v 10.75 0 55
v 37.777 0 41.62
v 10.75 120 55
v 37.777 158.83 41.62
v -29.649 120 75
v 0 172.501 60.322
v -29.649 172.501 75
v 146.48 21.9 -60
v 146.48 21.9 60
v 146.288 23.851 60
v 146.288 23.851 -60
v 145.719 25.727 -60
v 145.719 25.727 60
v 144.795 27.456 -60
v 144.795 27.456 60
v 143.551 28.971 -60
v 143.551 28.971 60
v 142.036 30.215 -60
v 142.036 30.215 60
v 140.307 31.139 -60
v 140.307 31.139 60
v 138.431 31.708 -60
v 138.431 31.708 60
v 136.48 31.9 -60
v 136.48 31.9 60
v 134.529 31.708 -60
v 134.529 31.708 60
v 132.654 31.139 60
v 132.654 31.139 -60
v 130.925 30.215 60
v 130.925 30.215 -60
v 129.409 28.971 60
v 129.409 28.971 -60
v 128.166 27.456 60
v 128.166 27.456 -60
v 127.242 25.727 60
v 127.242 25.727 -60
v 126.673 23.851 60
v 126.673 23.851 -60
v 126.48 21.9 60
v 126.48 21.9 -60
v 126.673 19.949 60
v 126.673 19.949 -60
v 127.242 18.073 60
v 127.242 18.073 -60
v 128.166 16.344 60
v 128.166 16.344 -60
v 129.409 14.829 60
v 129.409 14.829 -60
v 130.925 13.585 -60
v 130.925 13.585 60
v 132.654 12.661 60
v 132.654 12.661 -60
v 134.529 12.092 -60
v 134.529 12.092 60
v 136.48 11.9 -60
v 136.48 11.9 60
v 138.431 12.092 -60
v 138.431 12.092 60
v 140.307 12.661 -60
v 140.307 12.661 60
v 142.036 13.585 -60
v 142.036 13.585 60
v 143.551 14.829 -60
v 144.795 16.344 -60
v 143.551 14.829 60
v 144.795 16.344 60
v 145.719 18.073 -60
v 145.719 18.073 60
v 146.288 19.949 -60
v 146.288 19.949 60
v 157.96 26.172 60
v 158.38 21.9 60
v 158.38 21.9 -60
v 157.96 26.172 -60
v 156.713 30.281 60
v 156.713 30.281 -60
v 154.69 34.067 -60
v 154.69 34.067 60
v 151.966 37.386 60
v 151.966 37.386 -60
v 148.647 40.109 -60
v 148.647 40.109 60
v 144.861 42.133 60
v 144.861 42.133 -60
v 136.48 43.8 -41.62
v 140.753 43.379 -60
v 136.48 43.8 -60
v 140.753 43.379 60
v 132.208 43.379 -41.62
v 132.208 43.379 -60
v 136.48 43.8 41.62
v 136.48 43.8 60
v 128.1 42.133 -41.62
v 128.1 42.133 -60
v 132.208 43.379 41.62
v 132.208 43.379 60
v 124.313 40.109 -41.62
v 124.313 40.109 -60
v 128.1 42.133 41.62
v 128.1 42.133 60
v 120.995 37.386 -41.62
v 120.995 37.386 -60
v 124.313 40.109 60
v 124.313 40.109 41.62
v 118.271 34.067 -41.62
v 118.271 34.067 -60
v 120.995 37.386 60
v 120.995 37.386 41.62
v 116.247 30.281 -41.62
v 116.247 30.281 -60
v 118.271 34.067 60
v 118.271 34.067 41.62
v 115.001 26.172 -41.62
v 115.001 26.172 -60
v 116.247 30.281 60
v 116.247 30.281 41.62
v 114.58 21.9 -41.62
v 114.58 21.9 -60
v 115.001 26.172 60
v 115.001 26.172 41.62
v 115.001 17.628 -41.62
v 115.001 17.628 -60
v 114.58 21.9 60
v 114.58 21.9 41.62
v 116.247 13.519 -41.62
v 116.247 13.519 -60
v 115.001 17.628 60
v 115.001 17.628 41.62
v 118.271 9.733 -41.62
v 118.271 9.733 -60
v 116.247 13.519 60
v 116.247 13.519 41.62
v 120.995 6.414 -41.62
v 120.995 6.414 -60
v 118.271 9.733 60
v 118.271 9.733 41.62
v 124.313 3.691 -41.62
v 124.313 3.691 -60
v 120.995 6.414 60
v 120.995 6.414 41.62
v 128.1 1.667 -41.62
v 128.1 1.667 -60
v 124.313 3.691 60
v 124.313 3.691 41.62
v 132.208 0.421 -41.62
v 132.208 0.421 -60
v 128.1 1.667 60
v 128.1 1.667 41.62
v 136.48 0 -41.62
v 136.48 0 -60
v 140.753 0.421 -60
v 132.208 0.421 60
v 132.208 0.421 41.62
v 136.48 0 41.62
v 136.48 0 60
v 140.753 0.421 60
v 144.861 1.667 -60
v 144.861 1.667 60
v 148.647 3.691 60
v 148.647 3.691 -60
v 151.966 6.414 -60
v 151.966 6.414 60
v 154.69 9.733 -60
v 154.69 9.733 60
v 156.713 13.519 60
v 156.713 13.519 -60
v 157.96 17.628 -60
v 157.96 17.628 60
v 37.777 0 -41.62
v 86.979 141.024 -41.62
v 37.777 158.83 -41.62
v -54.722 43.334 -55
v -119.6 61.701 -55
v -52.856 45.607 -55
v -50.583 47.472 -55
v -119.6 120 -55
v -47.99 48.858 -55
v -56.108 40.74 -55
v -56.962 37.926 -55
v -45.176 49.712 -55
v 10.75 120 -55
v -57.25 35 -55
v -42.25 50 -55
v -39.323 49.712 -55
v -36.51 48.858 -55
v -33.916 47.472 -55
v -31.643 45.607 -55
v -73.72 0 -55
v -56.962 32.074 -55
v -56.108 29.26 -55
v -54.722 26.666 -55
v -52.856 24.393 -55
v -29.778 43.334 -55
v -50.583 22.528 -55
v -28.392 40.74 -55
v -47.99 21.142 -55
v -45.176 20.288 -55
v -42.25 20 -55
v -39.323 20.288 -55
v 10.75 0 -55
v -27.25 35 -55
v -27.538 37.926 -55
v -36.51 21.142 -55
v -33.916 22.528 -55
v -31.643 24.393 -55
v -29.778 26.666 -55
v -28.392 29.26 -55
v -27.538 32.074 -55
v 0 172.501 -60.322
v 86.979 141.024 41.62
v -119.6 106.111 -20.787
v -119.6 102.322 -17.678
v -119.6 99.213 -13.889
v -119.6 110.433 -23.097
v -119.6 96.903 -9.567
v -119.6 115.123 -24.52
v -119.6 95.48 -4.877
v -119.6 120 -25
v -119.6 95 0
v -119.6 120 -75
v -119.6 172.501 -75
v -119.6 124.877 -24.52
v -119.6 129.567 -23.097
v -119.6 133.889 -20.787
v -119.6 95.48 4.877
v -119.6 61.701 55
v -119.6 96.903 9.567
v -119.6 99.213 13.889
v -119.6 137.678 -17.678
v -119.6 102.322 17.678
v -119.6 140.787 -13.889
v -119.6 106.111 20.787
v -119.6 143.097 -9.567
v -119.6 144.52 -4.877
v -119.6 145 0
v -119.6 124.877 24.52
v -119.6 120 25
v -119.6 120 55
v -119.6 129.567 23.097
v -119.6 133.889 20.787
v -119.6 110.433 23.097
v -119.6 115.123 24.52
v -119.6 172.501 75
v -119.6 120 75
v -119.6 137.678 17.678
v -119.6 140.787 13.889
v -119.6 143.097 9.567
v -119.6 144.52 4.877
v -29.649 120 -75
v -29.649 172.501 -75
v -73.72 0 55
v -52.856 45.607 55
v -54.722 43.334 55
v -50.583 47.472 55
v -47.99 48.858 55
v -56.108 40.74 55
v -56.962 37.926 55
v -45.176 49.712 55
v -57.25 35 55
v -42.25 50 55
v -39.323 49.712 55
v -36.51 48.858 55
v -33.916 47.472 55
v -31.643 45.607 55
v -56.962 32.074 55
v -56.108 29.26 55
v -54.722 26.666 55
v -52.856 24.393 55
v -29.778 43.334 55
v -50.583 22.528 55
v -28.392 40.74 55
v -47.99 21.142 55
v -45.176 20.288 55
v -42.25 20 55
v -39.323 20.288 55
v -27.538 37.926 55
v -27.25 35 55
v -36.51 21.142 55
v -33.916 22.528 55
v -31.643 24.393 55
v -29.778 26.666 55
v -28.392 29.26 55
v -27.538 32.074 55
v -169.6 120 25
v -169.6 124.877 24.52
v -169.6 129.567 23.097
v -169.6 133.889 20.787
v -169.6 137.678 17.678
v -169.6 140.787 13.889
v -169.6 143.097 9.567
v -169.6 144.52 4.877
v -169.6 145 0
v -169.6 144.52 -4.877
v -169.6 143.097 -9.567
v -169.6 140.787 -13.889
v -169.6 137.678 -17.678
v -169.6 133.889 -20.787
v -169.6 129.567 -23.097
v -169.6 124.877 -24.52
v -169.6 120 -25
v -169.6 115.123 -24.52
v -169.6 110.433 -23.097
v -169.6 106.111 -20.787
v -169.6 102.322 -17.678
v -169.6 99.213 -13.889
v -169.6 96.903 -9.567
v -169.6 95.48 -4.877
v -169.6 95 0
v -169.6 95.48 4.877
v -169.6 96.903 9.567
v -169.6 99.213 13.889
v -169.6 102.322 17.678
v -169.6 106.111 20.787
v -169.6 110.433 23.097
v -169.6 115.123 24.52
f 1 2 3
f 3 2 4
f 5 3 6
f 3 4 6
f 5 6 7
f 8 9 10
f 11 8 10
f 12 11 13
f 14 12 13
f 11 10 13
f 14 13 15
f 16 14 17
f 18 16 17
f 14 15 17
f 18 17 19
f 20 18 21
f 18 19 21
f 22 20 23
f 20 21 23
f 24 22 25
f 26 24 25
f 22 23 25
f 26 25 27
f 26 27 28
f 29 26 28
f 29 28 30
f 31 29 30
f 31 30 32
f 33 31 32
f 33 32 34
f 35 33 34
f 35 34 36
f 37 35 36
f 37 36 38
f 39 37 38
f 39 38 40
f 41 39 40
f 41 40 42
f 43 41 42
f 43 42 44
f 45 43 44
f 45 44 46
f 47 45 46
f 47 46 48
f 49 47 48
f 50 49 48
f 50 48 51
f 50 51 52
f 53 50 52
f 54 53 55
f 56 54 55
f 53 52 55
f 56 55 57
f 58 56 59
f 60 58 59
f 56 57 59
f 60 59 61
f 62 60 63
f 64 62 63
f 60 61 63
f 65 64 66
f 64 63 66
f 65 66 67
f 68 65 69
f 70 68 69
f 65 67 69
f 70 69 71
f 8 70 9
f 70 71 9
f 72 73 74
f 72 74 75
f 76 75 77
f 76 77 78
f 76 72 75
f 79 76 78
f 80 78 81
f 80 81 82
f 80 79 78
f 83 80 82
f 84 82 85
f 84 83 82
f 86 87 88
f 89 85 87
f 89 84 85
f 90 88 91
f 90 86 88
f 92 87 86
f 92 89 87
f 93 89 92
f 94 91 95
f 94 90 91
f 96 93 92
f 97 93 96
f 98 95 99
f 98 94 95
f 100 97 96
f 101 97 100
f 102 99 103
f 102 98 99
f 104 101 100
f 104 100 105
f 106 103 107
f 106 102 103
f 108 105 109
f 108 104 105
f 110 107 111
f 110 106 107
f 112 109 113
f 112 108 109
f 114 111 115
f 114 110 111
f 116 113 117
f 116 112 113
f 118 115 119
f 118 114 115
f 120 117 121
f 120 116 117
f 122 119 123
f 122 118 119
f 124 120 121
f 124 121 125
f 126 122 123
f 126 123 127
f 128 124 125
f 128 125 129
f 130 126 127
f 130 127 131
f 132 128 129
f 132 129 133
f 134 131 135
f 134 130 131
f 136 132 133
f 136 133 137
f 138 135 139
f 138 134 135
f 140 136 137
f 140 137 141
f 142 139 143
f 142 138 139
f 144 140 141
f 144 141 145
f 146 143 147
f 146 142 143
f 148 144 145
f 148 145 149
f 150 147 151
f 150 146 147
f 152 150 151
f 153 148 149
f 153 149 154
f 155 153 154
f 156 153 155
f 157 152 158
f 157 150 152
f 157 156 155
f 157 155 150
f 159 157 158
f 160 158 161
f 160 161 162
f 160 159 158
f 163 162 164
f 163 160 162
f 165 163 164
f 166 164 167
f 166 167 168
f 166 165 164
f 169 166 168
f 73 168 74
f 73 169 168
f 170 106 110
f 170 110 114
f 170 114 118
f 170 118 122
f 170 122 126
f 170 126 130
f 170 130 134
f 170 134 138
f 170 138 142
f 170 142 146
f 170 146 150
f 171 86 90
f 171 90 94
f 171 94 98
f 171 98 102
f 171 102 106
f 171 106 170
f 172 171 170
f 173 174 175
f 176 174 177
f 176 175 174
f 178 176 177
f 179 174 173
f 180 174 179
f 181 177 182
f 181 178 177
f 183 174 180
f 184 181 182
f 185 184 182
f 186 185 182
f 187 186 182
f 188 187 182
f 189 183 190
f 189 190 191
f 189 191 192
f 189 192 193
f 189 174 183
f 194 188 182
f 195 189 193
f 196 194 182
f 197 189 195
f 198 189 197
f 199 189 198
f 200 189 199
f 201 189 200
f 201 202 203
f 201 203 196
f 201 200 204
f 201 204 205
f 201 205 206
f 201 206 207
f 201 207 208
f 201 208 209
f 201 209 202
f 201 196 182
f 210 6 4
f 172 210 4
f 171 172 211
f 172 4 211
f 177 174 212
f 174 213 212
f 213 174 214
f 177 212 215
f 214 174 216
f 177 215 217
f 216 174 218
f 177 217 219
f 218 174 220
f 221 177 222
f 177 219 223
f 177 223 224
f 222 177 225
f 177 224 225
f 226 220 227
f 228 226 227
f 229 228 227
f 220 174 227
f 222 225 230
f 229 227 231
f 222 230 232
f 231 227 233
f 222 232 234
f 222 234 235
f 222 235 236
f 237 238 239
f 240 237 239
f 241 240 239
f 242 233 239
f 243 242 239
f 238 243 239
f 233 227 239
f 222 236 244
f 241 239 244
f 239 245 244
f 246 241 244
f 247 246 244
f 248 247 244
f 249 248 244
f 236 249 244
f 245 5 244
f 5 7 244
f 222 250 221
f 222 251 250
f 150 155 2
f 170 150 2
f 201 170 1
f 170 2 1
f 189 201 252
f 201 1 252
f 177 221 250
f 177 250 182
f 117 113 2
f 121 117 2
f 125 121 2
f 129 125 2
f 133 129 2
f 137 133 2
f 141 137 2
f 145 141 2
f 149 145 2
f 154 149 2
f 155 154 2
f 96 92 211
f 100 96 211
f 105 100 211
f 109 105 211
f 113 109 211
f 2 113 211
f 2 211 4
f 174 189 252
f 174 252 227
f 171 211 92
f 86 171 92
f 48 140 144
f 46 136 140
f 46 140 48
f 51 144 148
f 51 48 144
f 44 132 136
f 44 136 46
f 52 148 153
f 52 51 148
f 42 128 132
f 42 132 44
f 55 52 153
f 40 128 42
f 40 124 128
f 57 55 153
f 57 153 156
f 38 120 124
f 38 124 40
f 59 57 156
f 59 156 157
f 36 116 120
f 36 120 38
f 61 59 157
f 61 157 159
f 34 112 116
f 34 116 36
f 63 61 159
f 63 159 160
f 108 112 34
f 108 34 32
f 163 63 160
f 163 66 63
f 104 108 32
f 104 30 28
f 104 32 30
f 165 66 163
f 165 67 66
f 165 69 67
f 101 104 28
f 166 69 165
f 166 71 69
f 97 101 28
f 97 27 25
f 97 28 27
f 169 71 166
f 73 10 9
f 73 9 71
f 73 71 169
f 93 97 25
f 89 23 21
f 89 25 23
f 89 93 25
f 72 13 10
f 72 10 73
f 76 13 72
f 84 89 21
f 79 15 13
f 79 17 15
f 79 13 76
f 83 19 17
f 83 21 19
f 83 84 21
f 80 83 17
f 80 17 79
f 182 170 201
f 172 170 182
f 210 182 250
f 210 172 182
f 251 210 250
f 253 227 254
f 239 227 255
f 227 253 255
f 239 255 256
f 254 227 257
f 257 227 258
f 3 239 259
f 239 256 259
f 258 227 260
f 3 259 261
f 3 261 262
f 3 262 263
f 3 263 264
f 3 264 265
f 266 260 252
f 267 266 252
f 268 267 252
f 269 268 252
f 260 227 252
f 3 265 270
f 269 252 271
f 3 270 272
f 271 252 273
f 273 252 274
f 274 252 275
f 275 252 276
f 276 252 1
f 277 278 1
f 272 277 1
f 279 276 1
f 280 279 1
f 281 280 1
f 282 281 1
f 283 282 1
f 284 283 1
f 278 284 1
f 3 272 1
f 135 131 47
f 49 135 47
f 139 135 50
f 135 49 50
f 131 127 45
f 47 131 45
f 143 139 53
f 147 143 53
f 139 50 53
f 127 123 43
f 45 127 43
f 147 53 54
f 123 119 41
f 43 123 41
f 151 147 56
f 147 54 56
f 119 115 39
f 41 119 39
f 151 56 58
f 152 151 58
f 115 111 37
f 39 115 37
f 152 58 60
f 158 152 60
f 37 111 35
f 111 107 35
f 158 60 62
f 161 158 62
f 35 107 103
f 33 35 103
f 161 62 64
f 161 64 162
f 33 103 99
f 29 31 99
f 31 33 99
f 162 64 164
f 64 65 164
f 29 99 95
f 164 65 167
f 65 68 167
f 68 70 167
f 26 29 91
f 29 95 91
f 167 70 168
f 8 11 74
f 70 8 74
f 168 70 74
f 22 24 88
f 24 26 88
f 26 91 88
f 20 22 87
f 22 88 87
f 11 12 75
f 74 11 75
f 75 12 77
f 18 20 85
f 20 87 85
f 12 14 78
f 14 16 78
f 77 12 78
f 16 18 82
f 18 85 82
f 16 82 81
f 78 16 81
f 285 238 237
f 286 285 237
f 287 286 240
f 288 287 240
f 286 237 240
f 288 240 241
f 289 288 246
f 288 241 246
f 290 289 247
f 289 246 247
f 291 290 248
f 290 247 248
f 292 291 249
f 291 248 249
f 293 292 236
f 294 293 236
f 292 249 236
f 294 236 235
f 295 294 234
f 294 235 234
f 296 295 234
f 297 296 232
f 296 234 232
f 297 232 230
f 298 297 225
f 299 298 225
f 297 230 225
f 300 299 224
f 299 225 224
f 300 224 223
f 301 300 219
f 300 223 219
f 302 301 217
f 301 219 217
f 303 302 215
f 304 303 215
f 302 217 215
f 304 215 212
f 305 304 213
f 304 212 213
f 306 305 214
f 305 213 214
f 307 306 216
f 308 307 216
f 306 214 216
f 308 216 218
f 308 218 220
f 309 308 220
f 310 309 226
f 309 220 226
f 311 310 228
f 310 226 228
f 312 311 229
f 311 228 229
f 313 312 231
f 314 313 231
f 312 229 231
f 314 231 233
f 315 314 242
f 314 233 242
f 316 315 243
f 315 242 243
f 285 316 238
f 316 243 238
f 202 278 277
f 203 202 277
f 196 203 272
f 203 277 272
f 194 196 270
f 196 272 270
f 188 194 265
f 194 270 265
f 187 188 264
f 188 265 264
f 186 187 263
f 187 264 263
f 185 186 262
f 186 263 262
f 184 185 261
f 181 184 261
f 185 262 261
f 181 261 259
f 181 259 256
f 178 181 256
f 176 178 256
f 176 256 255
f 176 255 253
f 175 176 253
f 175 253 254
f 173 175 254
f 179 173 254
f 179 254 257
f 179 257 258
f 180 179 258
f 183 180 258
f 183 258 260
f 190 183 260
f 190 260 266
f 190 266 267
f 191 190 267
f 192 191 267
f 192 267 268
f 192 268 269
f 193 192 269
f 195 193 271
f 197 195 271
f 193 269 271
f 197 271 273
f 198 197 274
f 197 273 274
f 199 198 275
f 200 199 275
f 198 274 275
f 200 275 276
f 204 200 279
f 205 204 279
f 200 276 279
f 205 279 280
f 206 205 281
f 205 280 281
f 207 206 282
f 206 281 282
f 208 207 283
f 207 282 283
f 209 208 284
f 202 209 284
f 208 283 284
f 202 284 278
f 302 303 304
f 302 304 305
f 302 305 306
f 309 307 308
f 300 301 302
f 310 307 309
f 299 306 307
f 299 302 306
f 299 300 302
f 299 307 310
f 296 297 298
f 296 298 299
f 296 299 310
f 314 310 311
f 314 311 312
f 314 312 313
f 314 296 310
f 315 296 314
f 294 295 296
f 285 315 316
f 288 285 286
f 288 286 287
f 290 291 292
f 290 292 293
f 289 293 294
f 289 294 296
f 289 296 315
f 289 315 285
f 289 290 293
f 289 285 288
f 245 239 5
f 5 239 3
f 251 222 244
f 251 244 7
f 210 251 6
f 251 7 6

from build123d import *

# Parameters (mm, degrees)
EXTRUDE_1_DEPTH          = 75
SKETCH_2_W               = 185.8
SKETCH_2_H               = 57.3
CUT_EXTRUDE_2_DEPTH      = 120
CUT_EXTRUDE_3_DEPTH      = 400
SKETCH_5_R               = 21.9
EXTRUDE_2_DEPTH          = 60
SKETCH_6_R               = 10
CUT_EXTRUDE_4_DEPTH      = 200
SKETCH_8_R               = 15
CUT_EXTRUDE_5_DEPTH      = 21
CUT_EXTRUDE_5_DEPTH_BACK = 131
SKETCH_9_R               = 25
EXTRUDE_3_DEPTH          = 50


with BuildPart() as part:
    # 草图1 → 凸台-拉伸1 (new body, symmetric)
    with BuildSketch(Plane.XY):
        Polygon((-119.6, 172.501416068), (0, 172.501416068), (86.979350222, 141.023763122), (136.480359145, 43.8), (136.480359145, 0), (-73.719640855, 0), (-119.6, 61.701416068), align=None)
    extrude(amount=EXTRUDE_1_DEPTH, both=True)

    # 草图2 → 切除-拉伸2 (cut)
    with BuildSketch(Plane(origin=(0, 0, 0), x_dir=(1, 0, 0), z_dir=(0, 1, 0))):
        with Locations((-51.7, 83.65)):
            Rectangle(SKETCH_2_W, SKETCH_2_H)
        with Locations((-51.7, -83.65)):
            Rectangle(SKETCH_2_W, SKETCH_2_H)
    extrude(amount=CUT_EXTRUDE_2_DEPTH, mode=Mode.SUBTRACT)

    # 草图3 → 切除-拉伸3 (cut)
    with BuildSketch(Plane(origin=(0, 172.501416068, 0), x_dir=(1, 0, 0), z_dir=(0, 1, 0))):
        Polygon((-64.837283081, 92.42032951), (245.362716919, 92.42032951), (245.362716919, 41.62032951), (37.776604868, 41.62032951), align=None)
        Polygon((37.776604868, -41.62032951), (-64.837283081, -92.42032951), (245.362716919, -92.42032951), (245.362716919, -41.62032951), align=None)
    extrude(amount=-CUT_EXTRUDE_3_DEPTH, mode=Mode.SUBTRACT)

    # 草图5 → 凸台-拉伸2 (add, symmetric)
    with BuildSketch(Plane.XY):
        with Locations((136.480359145, 21.9)):
            Circle(SKETCH_5_R)
    extrude(amount=EXTRUDE_2_DEPTH, both=True)

    # 草图6 → 切除-拉伸4 (cut)
    with BuildSketch(Plane.XY.offset(60)):
        with Locations((136.480359145, 21.9)):
            Circle(SKETCH_6_R)
    extrude(amount=-CUT_EXTRUDE_4_DEPTH, mode=Mode.SUBTRACT)

    # 草图8 → 切除-拉伸5 (cut, two sides)
    with BuildSketch(Plane.XY.offset(55)) as cut_extrude_5_sk:
        with Locations((-42.249773251, 35)):
            Circle(SKETCH_8_R)
    extrude(amount=CUT_EXTRUDE_5_DEPTH, mode=Mode.SUBTRACT)
    extrude(cut_extrude_5_sk.sketch, amount=-CUT_EXTRUDE_5_DEPTH_BACK, mode=Mode.SUBTRACT)

    # 草图9 → 凸台-拉伸3 (add)
    with BuildSketch(Plane.ZY.offset(119.6)):
        with Locations((0, 120)):
            Circle(SKETCH_9_R)
    extrude(amount=EXTRUDE_3_DEPTH)


solid = part.part
